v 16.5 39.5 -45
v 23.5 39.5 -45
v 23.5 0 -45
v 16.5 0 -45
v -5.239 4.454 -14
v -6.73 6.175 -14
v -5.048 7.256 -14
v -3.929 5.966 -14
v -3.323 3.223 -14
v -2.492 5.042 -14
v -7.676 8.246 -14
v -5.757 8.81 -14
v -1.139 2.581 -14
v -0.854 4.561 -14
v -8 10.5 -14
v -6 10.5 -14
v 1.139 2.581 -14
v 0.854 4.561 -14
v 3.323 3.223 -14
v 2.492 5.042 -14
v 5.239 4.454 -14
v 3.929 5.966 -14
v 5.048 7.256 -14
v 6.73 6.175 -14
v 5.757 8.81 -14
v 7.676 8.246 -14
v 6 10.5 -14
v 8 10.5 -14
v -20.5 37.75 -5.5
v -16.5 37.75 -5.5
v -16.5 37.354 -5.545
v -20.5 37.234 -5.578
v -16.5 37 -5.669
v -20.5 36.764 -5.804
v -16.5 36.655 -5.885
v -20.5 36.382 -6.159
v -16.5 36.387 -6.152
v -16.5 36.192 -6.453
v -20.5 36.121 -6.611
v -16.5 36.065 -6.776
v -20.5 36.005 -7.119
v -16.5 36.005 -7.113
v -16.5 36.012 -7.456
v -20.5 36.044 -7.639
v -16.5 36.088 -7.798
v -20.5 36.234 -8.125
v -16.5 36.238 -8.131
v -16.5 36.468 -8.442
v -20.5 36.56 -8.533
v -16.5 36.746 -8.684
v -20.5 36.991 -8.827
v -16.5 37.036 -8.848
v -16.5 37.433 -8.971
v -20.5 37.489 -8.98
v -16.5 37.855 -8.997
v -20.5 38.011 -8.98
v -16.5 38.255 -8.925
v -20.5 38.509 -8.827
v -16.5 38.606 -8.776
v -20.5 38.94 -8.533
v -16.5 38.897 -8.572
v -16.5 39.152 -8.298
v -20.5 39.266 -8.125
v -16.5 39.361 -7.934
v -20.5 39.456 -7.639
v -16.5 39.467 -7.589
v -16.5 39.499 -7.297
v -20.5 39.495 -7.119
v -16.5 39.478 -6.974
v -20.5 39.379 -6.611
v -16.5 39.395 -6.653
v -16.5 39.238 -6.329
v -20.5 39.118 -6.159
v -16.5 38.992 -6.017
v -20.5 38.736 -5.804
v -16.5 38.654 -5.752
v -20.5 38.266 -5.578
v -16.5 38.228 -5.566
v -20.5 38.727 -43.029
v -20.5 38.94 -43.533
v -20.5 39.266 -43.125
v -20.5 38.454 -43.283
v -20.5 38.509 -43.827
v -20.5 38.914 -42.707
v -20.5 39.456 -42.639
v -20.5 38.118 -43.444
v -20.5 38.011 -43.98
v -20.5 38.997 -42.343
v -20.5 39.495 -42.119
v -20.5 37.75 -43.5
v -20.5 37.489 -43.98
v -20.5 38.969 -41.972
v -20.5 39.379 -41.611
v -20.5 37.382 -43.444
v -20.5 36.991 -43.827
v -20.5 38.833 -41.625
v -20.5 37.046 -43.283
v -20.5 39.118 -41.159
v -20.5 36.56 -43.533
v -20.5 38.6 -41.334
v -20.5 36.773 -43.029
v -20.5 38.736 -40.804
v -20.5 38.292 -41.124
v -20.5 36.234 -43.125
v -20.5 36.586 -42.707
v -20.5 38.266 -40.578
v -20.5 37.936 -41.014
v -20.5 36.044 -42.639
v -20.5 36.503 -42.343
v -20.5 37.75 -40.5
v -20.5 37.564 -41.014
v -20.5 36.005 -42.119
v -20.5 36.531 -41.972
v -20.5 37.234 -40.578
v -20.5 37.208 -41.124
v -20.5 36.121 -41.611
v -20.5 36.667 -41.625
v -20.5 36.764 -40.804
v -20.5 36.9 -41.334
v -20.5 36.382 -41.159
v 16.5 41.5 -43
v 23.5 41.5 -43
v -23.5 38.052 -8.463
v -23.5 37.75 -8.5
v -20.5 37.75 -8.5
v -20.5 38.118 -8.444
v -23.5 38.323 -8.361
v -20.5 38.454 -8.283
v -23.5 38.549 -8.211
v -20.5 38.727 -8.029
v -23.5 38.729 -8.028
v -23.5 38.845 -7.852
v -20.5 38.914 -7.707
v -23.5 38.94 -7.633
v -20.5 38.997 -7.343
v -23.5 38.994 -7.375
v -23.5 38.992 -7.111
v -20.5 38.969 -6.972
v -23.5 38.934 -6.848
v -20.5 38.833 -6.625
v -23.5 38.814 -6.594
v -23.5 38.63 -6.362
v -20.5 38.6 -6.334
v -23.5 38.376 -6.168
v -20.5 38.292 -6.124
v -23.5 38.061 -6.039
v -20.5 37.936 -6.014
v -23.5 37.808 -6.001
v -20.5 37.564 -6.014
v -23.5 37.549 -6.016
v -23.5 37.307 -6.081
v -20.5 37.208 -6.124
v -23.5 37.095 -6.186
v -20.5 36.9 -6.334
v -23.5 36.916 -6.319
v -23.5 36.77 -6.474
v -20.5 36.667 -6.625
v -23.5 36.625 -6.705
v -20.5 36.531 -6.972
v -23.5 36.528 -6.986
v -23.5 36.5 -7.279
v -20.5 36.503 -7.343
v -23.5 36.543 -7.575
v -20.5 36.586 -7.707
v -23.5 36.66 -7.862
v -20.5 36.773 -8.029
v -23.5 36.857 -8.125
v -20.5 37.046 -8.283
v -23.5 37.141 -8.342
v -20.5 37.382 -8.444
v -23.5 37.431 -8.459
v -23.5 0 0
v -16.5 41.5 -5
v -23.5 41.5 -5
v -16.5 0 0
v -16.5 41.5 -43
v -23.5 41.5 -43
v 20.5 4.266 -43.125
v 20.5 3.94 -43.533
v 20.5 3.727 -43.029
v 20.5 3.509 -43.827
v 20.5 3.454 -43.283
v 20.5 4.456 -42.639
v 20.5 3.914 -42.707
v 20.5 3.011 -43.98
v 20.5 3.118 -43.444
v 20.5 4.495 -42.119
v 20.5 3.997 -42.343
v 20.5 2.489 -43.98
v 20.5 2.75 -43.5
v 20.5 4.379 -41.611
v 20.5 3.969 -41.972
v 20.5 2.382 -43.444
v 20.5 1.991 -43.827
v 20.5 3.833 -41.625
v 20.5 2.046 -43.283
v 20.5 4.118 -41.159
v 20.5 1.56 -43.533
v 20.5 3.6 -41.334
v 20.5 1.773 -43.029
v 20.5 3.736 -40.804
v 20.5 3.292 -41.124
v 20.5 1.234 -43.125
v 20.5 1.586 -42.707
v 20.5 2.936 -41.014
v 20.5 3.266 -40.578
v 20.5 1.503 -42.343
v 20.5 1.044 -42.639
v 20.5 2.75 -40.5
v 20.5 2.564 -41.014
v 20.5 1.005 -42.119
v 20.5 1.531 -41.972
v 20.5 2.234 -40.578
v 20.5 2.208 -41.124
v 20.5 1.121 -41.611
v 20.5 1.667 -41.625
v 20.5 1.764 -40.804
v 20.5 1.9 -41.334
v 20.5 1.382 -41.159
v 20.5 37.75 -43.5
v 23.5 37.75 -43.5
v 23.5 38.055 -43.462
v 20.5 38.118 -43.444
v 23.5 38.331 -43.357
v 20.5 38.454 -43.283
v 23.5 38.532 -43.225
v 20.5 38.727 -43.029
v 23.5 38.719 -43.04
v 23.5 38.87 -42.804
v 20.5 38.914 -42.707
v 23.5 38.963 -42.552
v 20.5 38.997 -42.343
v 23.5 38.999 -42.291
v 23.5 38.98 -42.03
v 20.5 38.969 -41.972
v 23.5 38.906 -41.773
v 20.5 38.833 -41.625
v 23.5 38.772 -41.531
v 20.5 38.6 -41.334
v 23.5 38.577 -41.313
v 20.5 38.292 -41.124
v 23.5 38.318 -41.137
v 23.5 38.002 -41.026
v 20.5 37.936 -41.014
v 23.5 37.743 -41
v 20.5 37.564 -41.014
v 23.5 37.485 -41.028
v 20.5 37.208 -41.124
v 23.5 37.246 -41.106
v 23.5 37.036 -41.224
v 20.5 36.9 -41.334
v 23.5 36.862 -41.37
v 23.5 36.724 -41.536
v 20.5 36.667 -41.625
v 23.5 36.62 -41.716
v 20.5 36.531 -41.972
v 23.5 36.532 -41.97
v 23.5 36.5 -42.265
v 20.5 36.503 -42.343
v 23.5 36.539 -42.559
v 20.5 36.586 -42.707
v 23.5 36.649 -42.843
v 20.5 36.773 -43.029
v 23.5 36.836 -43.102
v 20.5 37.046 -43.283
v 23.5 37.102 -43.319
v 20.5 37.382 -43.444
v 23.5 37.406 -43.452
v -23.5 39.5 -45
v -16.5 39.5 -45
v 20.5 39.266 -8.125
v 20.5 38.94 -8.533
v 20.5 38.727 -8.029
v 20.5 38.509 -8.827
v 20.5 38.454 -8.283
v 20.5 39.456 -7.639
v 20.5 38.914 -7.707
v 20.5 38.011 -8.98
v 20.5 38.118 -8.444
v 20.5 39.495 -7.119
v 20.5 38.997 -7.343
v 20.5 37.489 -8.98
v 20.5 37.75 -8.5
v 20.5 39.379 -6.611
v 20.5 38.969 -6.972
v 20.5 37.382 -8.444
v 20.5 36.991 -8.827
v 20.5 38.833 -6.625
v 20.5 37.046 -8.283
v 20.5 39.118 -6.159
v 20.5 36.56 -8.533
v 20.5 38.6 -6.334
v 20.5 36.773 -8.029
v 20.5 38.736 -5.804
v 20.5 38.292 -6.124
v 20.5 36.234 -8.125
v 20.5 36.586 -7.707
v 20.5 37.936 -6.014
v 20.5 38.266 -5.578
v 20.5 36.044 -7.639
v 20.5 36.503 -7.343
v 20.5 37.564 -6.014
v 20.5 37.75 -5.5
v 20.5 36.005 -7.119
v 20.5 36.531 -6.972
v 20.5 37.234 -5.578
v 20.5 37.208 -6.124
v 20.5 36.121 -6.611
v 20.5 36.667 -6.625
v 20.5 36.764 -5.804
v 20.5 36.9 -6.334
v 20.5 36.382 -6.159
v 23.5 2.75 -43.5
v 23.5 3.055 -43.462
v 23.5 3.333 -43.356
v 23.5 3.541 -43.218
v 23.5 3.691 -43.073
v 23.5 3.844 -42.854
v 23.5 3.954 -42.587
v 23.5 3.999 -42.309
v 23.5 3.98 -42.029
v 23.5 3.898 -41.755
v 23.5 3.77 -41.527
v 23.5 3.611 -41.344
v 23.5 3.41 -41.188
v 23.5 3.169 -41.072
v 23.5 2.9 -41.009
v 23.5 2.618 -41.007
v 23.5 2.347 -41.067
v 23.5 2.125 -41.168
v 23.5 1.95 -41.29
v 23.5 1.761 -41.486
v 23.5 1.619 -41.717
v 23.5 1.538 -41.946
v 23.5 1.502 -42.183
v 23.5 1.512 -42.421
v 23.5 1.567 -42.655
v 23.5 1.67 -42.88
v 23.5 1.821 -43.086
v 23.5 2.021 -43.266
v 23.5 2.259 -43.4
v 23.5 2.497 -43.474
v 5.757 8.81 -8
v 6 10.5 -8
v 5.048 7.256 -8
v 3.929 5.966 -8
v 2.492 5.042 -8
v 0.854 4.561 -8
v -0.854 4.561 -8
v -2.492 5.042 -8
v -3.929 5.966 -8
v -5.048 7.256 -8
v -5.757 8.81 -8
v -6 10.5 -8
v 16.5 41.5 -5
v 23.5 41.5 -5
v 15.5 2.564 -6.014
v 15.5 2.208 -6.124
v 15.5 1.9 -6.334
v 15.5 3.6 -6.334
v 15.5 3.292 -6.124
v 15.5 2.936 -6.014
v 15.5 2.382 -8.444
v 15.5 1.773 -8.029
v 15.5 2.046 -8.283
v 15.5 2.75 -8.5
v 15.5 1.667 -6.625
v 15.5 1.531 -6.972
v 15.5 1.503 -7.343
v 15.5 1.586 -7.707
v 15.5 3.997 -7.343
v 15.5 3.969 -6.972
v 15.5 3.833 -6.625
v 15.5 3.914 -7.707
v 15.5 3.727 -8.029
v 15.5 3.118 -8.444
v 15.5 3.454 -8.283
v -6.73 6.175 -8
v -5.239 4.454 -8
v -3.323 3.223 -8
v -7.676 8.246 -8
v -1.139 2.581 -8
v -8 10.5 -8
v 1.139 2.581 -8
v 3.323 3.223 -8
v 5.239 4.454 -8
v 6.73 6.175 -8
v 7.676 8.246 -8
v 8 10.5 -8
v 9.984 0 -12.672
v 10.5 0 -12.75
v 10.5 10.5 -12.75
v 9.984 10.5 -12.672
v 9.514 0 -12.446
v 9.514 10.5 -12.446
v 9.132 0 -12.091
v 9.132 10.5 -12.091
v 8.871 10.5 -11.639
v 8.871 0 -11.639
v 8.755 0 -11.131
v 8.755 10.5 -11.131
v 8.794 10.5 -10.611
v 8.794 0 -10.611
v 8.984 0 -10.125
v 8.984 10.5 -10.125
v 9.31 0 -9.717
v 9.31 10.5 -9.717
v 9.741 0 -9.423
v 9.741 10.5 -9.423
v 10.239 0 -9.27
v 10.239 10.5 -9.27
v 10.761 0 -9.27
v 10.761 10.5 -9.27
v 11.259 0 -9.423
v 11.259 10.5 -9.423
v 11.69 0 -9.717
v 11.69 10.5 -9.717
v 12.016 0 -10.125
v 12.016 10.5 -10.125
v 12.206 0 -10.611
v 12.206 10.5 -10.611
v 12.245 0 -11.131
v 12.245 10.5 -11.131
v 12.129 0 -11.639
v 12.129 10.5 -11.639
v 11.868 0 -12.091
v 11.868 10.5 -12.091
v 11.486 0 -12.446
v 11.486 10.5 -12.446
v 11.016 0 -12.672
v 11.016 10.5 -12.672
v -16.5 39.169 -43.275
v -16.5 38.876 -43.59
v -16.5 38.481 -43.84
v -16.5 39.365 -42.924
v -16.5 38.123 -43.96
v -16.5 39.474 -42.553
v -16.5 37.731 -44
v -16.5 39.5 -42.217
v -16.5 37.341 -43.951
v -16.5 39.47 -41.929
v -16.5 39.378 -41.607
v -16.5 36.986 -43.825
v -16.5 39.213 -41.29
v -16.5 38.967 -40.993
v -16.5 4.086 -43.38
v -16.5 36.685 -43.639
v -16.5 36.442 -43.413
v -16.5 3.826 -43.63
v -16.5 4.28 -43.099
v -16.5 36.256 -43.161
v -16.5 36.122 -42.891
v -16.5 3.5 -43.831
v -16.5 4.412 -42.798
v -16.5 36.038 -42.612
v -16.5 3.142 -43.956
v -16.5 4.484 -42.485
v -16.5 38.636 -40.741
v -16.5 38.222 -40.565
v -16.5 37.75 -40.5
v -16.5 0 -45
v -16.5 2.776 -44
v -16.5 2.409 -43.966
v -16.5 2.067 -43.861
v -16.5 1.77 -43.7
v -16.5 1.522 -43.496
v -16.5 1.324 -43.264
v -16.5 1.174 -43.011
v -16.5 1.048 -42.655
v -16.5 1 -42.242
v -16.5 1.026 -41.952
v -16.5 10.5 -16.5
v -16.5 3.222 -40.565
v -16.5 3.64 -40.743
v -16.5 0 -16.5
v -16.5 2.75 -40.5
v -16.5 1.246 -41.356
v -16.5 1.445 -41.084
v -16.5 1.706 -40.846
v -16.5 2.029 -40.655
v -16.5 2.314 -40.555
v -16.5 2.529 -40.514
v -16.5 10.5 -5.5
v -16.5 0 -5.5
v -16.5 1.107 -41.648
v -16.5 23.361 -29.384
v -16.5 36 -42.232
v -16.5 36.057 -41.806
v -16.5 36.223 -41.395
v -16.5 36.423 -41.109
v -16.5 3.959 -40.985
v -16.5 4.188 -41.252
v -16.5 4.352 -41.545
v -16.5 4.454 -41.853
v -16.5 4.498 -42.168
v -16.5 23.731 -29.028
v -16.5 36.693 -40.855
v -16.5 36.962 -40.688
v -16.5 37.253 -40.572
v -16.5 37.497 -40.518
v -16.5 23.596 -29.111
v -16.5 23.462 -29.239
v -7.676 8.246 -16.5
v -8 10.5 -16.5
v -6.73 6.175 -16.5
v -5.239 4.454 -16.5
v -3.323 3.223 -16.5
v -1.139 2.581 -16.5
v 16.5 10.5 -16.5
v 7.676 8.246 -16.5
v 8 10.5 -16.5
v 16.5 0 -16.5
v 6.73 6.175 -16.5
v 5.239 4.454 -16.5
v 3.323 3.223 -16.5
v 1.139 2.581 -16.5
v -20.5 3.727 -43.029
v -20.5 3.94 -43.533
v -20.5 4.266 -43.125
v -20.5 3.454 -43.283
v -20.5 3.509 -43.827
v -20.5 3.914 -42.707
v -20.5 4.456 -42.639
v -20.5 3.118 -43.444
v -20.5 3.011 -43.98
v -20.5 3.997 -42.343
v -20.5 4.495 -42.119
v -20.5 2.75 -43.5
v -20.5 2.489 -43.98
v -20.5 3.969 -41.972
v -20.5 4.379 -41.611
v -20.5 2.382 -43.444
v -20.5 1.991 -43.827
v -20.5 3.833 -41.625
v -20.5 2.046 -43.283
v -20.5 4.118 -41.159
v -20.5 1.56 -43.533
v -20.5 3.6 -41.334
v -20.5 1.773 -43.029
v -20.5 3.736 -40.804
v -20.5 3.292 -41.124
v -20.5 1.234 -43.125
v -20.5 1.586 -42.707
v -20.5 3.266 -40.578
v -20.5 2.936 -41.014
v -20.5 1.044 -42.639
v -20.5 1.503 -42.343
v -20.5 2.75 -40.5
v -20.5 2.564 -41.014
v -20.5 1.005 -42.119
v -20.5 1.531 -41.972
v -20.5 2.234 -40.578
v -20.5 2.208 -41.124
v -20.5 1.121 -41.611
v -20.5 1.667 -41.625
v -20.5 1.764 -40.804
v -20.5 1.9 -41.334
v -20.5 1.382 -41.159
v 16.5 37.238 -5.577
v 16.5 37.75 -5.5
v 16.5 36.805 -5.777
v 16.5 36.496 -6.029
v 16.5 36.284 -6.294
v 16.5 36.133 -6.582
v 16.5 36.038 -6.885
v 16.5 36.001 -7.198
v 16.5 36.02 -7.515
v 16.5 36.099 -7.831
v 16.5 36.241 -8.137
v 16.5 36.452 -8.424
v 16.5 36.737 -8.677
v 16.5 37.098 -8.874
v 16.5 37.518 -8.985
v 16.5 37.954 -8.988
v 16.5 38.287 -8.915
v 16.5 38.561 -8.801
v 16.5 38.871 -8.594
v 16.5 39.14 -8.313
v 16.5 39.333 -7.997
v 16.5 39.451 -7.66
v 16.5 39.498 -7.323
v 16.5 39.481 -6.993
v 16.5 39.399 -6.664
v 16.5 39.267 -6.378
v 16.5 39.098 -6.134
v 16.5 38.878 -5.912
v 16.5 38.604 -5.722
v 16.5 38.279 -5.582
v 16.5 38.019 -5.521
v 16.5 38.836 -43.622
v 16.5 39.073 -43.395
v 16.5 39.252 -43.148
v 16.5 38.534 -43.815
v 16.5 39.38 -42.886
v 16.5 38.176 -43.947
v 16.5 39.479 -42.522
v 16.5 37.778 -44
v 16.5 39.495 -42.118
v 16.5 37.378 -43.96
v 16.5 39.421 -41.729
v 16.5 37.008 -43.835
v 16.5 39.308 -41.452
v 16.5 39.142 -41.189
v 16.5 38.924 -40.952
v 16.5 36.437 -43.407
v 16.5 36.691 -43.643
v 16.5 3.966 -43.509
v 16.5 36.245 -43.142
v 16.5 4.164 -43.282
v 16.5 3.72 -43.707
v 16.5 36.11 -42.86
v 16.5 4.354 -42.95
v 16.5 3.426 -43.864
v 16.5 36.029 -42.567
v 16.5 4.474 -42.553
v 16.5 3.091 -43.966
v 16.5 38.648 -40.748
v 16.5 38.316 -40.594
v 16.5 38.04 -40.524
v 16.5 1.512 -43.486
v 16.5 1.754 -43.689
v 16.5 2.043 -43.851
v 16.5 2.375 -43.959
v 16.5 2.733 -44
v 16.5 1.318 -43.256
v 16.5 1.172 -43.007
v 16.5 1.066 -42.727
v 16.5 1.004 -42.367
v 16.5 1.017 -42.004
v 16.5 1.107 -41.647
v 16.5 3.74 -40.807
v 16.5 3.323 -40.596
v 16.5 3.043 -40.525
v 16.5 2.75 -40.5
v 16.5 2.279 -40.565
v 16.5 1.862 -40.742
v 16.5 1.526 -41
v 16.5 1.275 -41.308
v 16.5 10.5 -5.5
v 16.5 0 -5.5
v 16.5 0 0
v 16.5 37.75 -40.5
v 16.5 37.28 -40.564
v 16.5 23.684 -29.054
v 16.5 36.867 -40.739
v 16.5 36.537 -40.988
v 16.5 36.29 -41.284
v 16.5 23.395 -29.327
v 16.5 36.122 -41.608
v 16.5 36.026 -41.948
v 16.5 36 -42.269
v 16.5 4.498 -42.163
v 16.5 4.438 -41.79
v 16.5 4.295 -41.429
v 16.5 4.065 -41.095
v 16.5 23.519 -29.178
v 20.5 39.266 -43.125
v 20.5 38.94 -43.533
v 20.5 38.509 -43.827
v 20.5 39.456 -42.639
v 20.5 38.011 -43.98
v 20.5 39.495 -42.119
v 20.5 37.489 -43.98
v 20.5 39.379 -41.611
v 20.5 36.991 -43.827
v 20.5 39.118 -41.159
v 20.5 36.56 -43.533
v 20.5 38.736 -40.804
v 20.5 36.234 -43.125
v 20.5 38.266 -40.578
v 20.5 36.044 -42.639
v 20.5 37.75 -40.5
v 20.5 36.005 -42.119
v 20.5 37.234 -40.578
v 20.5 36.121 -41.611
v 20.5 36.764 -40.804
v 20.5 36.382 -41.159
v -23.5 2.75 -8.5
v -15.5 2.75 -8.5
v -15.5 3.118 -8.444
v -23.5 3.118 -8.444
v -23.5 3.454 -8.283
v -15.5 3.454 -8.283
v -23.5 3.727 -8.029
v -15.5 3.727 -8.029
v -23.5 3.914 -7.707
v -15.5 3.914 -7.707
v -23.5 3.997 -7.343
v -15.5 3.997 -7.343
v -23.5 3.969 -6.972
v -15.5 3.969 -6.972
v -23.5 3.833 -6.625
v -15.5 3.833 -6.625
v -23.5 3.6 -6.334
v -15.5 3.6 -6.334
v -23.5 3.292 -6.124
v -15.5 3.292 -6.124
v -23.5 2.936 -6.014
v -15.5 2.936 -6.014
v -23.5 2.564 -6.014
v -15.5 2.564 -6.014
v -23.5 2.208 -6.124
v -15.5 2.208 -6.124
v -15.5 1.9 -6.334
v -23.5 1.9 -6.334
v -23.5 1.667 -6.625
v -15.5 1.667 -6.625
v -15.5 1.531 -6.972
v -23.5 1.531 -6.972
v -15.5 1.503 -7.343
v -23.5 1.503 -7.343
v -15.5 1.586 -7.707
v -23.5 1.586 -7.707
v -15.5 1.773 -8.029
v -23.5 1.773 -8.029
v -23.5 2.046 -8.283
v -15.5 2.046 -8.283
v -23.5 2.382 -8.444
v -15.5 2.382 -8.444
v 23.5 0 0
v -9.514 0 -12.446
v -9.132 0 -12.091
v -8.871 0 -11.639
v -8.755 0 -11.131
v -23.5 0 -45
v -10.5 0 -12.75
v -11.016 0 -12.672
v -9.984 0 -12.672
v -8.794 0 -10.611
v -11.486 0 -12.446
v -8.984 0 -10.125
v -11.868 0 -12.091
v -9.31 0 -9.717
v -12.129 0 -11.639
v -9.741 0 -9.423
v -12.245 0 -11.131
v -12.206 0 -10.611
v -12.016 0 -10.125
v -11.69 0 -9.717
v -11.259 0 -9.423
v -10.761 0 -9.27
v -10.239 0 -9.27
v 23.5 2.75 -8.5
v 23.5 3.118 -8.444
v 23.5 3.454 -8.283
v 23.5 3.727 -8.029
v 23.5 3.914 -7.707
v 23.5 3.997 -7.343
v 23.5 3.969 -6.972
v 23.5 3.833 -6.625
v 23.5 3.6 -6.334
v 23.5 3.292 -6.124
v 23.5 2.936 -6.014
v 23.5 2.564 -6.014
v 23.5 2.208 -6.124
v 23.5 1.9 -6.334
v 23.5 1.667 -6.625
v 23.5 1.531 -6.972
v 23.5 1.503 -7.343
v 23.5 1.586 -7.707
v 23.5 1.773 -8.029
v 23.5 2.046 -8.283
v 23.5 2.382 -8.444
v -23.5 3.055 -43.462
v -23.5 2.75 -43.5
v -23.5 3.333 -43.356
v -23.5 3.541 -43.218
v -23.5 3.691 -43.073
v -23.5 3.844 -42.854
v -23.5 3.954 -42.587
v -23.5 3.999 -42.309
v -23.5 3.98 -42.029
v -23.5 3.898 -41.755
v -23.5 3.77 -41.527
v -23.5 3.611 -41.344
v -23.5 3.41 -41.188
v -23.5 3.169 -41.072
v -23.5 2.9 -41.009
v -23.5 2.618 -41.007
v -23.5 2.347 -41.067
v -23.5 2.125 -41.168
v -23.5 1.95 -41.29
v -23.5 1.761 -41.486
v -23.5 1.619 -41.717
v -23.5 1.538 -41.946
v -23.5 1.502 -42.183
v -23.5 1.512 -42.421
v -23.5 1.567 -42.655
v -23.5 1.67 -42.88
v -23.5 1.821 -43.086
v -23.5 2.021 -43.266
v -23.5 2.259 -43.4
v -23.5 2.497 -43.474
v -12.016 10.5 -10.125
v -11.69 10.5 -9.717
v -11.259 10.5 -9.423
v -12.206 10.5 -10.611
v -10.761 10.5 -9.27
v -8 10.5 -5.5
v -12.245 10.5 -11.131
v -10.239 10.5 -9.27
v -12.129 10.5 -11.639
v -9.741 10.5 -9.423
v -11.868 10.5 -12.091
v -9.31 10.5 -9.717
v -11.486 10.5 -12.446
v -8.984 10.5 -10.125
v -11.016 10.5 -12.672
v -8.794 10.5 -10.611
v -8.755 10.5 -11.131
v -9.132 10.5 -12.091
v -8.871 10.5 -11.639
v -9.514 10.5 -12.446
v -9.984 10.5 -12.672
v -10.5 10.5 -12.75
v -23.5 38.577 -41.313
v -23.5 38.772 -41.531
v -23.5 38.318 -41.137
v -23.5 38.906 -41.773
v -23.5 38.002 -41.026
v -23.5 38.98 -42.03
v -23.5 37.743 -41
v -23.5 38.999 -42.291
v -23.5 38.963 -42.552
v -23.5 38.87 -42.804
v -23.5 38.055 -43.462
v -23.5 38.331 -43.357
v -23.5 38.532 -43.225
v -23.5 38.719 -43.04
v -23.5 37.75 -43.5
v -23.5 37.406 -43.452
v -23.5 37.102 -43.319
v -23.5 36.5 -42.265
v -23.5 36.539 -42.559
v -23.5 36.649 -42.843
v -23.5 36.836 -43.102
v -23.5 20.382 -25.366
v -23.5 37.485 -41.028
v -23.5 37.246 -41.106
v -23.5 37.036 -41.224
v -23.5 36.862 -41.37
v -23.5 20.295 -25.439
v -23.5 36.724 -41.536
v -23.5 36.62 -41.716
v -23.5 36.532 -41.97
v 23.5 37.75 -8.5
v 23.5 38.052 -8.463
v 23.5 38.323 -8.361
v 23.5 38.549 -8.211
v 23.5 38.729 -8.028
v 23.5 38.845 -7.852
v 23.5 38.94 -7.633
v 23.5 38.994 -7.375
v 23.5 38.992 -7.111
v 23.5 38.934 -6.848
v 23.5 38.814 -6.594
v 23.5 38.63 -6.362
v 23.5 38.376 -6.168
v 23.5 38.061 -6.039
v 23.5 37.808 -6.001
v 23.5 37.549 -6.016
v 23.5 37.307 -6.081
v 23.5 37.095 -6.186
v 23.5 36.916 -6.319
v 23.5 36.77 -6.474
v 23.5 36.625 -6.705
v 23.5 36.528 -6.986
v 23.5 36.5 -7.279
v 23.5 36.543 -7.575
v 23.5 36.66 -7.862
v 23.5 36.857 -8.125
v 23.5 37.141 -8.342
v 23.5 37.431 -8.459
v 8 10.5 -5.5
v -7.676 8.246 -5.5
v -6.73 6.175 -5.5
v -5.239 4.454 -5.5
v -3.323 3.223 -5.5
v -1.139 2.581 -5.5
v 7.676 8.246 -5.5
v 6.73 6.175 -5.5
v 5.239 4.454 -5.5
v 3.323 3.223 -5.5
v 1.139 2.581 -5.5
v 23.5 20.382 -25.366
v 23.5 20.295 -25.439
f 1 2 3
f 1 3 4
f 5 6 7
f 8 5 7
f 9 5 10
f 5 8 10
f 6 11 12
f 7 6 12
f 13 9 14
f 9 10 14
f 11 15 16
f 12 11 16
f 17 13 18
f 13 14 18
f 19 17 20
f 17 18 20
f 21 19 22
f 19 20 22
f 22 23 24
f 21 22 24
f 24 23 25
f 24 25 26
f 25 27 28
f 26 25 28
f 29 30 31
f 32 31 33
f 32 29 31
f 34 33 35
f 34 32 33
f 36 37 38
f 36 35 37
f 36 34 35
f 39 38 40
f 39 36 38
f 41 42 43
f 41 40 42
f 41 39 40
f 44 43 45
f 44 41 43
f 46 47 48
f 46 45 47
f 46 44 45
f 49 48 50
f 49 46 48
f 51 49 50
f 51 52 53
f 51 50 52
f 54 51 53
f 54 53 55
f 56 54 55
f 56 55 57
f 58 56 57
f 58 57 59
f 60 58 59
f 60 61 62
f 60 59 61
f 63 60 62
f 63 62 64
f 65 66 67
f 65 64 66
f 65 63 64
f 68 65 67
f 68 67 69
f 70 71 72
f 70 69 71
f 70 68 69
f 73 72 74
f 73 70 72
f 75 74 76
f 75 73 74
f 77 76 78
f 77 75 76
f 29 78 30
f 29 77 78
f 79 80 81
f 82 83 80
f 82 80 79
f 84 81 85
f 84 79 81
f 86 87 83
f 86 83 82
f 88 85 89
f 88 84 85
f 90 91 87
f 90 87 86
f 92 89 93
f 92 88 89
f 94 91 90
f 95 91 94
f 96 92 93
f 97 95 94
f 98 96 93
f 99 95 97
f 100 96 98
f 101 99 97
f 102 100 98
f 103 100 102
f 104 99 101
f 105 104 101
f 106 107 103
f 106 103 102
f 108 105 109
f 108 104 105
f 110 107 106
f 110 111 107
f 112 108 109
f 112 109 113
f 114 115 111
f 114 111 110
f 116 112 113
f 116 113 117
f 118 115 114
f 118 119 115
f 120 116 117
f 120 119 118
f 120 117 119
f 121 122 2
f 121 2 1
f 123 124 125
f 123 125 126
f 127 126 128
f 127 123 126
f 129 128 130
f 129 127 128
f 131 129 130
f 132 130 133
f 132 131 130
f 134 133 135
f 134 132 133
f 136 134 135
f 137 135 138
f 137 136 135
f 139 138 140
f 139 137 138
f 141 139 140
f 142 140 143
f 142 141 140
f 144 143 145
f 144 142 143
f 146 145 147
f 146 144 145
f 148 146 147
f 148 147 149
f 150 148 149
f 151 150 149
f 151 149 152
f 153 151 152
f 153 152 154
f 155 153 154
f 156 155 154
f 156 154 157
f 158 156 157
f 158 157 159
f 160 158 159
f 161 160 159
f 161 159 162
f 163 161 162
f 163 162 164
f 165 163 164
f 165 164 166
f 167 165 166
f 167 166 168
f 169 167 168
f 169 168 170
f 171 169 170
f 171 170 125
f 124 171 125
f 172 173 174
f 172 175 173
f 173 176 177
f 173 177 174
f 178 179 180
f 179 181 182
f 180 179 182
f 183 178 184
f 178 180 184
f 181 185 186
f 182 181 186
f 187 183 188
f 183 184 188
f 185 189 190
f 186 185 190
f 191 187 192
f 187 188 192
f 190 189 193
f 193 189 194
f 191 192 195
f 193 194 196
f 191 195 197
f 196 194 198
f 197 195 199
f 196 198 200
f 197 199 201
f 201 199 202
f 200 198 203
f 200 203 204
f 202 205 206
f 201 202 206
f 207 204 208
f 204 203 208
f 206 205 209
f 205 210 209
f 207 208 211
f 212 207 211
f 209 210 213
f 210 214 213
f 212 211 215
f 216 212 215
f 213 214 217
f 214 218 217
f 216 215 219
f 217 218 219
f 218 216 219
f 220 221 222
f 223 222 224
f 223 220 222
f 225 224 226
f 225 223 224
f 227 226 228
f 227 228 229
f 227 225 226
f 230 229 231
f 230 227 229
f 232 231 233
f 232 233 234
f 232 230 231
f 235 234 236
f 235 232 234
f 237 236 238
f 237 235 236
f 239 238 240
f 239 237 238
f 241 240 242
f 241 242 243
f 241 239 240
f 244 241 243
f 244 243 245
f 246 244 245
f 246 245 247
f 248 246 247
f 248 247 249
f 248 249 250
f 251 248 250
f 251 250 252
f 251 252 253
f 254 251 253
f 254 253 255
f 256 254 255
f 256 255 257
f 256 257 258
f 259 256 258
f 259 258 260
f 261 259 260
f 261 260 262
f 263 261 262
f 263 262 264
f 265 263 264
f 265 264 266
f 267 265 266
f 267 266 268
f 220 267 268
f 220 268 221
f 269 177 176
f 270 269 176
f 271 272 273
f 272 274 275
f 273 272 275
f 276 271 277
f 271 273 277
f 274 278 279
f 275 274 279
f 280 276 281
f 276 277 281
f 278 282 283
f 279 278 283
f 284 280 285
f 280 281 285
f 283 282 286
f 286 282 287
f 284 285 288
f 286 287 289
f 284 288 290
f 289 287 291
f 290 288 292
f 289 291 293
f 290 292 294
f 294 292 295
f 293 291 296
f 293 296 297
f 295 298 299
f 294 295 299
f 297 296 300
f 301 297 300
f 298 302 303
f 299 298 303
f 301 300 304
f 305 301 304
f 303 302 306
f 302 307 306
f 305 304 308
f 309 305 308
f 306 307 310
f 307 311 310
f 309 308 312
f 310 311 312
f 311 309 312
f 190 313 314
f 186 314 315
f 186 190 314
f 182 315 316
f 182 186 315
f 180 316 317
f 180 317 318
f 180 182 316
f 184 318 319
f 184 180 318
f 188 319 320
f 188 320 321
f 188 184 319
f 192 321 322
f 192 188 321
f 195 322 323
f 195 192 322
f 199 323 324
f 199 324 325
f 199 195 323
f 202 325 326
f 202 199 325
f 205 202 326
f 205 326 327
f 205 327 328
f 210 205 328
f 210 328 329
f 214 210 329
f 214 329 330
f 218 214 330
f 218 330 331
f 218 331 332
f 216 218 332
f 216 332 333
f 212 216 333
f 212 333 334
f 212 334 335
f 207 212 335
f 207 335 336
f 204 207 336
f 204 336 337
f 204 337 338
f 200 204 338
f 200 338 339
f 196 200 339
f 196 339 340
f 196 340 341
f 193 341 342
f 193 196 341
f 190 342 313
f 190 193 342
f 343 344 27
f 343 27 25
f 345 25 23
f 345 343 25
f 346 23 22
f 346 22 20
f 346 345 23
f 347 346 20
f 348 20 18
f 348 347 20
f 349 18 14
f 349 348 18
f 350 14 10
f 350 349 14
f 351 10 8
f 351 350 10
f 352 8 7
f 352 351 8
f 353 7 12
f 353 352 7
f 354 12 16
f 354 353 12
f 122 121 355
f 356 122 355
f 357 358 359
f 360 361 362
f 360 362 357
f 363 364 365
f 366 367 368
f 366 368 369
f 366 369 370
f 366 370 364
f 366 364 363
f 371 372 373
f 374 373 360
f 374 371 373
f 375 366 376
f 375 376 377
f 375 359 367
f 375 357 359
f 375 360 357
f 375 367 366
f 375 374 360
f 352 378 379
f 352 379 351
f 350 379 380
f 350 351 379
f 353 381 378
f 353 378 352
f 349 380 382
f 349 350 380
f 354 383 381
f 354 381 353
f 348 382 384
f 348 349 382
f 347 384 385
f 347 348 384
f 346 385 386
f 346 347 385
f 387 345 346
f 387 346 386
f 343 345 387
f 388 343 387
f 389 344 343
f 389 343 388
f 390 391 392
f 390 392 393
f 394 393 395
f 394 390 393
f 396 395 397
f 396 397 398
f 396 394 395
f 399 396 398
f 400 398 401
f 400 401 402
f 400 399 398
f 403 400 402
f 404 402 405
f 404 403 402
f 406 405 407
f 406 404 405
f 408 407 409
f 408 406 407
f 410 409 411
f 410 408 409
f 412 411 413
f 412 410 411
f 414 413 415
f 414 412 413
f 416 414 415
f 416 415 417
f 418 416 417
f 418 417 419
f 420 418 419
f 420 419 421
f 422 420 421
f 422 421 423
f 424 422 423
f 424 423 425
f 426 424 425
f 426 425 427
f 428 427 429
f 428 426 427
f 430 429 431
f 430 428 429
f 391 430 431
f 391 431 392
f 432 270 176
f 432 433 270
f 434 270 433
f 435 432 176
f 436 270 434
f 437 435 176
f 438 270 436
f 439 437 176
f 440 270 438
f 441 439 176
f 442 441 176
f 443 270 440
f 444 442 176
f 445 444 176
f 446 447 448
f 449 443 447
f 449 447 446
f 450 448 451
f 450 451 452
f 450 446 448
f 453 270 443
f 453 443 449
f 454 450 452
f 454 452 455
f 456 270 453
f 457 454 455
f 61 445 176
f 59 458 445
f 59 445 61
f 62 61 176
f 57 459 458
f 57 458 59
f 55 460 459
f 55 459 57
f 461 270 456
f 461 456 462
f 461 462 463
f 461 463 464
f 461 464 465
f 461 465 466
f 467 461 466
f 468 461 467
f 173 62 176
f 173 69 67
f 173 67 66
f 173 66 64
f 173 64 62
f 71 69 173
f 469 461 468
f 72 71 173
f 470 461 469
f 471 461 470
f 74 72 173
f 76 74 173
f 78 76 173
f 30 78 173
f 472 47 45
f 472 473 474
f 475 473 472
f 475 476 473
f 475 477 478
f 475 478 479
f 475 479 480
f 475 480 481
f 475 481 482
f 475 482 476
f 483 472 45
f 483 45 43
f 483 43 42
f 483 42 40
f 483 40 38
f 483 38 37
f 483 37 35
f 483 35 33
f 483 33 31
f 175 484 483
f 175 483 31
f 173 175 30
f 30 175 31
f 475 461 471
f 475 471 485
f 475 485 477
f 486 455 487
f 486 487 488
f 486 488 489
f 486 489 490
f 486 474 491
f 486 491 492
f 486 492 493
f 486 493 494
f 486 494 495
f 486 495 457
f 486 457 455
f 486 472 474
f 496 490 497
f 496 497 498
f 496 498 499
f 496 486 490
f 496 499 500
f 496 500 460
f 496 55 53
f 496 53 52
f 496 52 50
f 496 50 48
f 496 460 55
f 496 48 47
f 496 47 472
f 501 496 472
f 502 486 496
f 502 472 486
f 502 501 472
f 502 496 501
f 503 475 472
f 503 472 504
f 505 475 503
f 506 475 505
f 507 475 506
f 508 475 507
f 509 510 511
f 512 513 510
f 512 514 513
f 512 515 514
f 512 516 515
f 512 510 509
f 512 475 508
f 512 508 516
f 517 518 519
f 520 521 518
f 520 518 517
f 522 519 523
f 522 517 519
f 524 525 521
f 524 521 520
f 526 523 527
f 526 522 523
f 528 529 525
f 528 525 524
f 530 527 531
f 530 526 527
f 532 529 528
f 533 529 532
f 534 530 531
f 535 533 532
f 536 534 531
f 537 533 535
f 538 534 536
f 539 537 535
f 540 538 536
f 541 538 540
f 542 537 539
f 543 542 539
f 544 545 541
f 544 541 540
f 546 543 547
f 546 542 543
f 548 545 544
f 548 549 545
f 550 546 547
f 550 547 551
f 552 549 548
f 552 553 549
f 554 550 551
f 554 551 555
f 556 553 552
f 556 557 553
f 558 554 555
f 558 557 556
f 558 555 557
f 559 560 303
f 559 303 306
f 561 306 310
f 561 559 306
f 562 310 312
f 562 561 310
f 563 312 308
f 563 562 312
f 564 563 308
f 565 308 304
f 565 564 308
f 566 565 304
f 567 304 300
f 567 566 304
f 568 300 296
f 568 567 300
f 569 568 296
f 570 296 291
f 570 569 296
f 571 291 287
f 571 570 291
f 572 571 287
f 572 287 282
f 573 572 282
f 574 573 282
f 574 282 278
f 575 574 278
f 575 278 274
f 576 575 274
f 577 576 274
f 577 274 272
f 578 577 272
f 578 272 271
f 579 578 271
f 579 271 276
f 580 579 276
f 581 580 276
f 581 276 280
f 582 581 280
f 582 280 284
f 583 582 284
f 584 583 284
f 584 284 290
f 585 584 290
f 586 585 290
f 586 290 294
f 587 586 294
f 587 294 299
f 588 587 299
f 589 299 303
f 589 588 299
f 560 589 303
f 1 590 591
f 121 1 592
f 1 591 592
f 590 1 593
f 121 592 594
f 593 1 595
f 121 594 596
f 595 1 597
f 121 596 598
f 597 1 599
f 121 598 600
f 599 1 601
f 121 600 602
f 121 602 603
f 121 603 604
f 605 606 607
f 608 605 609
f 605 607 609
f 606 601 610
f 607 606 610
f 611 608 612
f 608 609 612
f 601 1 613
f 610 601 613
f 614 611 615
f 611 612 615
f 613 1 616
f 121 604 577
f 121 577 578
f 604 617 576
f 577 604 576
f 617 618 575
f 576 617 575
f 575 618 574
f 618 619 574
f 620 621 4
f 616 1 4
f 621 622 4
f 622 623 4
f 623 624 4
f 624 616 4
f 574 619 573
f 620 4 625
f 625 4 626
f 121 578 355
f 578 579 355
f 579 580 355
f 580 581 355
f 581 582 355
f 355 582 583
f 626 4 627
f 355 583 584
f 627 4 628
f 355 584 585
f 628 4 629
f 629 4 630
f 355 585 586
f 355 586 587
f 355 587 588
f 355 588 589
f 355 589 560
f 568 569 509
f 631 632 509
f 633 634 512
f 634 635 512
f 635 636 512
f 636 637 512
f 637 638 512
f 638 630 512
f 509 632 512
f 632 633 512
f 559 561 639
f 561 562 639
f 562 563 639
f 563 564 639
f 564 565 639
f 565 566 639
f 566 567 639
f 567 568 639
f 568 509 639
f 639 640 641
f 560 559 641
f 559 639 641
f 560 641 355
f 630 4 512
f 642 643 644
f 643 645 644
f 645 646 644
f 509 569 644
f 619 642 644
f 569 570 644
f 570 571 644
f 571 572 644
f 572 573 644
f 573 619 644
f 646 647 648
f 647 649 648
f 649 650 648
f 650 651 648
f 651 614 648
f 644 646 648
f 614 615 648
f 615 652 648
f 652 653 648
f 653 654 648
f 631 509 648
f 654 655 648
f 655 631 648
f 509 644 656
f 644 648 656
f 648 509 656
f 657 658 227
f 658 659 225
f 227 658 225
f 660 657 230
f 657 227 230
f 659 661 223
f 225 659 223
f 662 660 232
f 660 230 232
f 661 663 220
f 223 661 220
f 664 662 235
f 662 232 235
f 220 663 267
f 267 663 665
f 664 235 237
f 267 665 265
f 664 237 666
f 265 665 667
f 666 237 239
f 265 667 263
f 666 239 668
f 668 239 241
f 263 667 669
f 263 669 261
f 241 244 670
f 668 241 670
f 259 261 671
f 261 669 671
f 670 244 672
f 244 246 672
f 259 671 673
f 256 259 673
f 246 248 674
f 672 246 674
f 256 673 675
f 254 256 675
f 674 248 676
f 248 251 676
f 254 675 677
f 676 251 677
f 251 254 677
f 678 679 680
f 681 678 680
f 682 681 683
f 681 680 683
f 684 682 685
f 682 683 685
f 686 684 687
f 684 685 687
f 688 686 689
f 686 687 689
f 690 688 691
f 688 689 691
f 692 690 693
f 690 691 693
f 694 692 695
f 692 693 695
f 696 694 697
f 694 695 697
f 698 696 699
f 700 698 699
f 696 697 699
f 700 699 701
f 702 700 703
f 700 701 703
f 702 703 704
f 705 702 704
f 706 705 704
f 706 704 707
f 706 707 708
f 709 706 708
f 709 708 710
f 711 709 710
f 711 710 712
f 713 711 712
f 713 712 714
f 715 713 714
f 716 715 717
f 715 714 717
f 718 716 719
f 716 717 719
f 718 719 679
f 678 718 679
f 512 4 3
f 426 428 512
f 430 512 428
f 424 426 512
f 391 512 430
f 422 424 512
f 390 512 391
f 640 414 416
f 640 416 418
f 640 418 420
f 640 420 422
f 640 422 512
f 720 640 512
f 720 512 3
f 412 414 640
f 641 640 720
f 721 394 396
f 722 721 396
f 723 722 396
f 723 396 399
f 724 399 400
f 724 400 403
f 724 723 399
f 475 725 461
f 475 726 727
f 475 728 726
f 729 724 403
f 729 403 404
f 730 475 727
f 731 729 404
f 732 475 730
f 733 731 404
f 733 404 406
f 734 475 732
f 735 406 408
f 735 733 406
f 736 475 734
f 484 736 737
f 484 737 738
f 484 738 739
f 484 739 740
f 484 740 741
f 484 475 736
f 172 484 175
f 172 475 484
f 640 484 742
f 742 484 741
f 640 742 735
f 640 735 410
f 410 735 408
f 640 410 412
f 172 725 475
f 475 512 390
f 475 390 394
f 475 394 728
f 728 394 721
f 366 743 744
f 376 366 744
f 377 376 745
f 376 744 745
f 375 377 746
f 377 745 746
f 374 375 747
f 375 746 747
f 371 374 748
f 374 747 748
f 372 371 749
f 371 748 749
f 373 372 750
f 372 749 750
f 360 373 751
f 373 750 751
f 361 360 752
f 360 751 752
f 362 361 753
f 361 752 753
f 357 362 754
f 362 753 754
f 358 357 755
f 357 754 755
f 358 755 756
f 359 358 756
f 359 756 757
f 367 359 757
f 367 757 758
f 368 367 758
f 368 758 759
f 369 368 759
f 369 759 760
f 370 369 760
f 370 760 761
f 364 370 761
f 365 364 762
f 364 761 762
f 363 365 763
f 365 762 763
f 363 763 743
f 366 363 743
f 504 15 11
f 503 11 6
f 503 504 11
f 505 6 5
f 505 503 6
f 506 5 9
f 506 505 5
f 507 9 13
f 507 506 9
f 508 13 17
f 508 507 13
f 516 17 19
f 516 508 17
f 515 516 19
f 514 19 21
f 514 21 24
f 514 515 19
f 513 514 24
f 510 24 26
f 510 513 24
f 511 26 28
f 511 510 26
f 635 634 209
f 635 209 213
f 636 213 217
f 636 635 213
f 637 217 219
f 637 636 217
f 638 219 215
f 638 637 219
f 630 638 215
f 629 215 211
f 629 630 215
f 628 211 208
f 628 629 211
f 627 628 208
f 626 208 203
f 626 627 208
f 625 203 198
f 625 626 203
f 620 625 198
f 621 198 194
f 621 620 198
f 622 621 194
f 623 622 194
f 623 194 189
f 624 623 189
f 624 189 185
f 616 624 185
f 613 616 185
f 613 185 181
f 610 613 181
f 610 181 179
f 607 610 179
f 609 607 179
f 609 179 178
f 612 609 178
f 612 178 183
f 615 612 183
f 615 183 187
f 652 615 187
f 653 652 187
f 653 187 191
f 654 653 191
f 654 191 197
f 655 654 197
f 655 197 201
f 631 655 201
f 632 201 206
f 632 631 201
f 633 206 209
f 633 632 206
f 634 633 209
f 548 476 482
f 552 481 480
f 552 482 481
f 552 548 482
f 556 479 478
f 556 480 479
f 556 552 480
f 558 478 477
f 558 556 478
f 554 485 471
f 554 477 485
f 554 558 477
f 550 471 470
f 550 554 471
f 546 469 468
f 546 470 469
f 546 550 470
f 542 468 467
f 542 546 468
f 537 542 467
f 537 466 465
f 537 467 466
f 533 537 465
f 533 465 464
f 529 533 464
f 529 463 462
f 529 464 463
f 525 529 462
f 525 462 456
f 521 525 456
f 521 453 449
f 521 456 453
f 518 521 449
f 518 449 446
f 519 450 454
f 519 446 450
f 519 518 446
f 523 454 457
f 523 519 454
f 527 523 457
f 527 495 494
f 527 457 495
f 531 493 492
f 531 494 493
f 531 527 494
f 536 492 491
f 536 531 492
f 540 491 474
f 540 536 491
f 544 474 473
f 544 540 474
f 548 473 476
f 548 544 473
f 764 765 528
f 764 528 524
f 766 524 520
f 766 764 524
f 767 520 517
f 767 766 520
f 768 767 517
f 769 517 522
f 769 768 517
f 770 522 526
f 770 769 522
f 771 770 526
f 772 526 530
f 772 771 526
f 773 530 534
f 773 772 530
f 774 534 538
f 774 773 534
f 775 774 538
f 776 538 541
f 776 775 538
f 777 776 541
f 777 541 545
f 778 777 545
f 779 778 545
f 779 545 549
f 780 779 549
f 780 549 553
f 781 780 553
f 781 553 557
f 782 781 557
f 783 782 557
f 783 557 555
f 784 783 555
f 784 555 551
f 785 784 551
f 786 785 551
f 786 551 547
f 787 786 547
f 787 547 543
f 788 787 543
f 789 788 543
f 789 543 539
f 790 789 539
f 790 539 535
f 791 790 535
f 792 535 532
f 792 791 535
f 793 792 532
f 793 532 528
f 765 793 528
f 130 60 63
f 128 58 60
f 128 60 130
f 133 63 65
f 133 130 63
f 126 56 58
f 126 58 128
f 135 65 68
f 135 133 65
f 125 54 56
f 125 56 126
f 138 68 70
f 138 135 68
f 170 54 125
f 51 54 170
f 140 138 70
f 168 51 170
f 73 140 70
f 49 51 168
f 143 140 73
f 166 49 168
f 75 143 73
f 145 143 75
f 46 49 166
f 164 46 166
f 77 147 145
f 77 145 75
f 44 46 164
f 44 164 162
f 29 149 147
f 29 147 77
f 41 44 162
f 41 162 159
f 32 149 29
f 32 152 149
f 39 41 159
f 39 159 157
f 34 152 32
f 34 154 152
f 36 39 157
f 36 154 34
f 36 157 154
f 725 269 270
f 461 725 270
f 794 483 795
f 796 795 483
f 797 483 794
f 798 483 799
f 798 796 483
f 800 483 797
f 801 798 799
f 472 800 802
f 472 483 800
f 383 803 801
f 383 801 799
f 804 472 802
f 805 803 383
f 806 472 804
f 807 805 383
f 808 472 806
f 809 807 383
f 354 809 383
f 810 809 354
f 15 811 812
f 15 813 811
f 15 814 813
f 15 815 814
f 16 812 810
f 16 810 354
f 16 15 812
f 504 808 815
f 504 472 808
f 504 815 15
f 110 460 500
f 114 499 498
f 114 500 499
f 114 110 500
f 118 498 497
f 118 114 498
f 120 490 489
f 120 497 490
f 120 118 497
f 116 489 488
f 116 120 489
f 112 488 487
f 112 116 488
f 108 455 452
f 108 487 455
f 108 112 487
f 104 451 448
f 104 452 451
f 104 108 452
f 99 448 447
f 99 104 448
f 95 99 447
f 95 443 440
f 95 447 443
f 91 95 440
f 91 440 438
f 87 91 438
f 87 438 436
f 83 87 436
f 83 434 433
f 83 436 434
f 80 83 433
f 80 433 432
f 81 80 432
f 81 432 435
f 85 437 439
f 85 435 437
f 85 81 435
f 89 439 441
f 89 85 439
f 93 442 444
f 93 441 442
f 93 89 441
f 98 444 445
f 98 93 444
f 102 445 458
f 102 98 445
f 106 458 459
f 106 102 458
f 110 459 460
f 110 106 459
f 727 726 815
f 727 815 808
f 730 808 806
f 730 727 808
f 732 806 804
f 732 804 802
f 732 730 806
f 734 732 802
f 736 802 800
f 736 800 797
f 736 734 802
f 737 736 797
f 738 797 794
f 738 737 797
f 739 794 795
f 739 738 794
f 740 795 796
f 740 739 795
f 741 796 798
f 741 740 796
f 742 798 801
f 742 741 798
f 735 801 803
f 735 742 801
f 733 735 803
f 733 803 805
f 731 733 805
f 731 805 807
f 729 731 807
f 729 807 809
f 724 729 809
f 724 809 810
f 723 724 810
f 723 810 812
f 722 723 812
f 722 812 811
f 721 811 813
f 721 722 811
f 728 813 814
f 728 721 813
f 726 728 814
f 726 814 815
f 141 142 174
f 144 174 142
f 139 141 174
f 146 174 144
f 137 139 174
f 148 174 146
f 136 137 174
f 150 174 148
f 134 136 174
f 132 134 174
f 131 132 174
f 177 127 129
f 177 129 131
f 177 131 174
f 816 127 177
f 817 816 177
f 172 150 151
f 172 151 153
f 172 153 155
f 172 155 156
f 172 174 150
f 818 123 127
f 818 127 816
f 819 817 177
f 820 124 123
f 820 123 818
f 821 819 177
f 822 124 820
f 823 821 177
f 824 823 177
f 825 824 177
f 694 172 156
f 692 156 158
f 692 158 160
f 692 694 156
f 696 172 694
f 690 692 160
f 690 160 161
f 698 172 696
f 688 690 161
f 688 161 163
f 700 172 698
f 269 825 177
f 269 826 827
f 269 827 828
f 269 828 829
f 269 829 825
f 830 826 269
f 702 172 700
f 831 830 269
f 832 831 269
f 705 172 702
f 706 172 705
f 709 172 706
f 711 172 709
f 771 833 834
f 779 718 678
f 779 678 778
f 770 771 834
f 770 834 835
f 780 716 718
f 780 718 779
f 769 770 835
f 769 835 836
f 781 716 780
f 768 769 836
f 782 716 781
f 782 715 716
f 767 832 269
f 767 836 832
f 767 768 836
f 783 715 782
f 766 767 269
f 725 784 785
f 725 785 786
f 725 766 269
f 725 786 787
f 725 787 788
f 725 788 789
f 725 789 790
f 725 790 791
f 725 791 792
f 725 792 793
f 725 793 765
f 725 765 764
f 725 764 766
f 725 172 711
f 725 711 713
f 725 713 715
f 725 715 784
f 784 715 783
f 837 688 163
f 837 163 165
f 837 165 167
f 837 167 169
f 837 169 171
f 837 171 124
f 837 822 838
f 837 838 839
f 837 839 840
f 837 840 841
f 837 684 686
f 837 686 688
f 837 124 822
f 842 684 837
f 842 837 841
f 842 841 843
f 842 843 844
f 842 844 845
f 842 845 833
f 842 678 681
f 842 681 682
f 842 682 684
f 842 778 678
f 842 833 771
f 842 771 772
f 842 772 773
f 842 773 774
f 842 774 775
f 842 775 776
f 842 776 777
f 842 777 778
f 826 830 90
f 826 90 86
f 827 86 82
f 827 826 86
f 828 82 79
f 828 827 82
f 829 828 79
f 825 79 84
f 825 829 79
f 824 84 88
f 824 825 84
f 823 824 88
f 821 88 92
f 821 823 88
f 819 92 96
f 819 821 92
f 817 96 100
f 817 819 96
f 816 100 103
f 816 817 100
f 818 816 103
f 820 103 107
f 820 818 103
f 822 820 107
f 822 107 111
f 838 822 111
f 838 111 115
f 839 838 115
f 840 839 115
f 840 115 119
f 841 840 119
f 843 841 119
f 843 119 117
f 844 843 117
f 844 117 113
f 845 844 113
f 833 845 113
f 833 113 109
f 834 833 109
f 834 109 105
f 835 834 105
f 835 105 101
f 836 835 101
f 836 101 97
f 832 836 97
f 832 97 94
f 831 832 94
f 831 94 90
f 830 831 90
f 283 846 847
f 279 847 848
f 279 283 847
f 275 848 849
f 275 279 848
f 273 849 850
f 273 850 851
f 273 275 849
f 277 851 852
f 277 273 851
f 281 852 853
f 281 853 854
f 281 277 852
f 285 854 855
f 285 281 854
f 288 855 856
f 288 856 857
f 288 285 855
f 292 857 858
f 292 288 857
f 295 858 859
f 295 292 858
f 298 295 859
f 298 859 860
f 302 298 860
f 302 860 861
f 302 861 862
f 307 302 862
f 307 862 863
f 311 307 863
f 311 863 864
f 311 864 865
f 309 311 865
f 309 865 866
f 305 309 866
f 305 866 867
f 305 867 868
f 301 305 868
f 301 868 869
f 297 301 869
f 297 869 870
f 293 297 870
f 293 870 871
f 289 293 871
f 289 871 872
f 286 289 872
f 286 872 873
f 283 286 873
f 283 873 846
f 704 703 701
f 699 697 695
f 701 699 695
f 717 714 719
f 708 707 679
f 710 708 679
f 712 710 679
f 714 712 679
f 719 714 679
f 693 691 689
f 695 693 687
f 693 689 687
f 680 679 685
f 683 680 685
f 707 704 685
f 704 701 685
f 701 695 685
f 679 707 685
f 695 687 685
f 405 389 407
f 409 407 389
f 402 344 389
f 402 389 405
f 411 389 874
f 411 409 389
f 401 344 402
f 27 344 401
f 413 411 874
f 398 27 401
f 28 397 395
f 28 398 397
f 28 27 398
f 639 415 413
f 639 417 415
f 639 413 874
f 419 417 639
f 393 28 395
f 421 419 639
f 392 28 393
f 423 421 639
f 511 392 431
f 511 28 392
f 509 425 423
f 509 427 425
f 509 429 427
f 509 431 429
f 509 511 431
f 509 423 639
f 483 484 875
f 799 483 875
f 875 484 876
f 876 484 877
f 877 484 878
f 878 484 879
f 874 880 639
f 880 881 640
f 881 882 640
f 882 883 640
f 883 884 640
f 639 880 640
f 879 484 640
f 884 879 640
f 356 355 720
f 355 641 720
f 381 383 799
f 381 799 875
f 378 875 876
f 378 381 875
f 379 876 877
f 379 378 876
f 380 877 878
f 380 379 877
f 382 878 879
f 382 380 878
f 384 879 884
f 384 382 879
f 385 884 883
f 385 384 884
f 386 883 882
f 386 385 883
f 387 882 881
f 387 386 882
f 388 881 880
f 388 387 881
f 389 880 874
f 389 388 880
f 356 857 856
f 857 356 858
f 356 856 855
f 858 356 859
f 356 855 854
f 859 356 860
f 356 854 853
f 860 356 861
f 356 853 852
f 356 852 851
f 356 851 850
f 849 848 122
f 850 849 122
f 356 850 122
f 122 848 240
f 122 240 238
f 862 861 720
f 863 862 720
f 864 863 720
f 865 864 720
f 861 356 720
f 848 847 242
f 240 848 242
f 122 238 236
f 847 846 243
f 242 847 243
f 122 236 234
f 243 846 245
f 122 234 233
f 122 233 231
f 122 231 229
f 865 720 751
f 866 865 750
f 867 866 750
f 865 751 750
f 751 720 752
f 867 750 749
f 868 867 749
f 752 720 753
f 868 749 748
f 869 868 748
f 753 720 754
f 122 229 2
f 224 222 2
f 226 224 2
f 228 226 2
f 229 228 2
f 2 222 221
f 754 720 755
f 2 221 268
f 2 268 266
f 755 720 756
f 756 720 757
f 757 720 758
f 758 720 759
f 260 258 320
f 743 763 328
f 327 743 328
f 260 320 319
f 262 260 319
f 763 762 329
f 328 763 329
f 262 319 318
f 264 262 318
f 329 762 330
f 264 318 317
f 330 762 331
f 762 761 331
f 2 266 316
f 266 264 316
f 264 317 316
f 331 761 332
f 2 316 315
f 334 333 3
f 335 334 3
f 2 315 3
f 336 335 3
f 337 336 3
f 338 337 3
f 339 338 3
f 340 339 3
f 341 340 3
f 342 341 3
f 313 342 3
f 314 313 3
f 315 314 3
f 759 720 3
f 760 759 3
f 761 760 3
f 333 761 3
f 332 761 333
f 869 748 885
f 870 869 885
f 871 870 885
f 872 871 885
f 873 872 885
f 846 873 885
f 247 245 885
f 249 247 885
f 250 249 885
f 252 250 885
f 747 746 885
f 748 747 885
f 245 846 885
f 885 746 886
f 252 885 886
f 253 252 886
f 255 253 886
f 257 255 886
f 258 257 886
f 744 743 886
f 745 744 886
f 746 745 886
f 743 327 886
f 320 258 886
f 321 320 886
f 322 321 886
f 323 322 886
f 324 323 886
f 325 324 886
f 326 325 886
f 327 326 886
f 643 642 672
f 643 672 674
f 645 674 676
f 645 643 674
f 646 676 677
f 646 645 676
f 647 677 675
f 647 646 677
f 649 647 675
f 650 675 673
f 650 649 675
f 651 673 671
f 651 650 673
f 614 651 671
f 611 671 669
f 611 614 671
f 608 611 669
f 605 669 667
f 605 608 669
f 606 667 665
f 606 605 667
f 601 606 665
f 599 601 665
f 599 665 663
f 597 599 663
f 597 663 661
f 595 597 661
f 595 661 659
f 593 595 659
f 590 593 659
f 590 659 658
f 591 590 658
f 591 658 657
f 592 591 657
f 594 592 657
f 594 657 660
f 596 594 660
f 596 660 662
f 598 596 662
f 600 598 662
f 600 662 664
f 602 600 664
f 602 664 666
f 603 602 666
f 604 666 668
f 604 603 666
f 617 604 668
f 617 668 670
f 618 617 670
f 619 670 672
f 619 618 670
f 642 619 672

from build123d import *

# Parameters (mm, degrees)
SKETCH1_W               = 33
SKETCH1_H               = 11
SKETCH1_R               = 1.75
BOSS_EXTRUDE1_DEPTH     = 10.5
CHAMFER1_SIZE           = 2
CUT_EXTRUDE1_DEPTH      = 66.570572836
CUT_EXTRUDE1_DEPTH_BACK = 66.570572836
SKETCH3_R               = 1.25
CUT_EXTRUDE2_DEPTH      = 20.5
CUT_EXTRUDE2_DEPTH_BACK = 20.5
SKETCH3_3_R             = 1.75
SKETCH3_3_R_2           = 1.25
CUT_EXTRUDE3_START      = 23.5
SKETCH3_6_R             = 1.25
CUT_EXTRUDE3_DEPTH      = 8
CUT_EXTRUDE4_START      = -15.5
SKETCH3_7_R             = 1.25
CUT_EXTRUDE4_DEPTH      = 8
CUT_EXTRUDE5_DEPTH      = 59.570470544
CUT_EXTRUDE5_DEPTH_BACK = 59.570470544
BOSS_EXTRUDE2_DEPTH     = 3


with BuildPart() as part:
    # Sketch1 → Boss-Extrude1 (new body)
    with BuildSketch(Plane(origin=(0, 0, 0), x_dir=(1, 0, 0), z_dir=(0, 1, 0))):
        with Locations((0, 11)):
            Rectangle(SKETCH1_W, SKETCH1_H)
        with Locations(Location((-10.5, 11, 0), (0, 0, 90))):
            Circle(SKETCH1_R, mode=Mode.SUBTRACT)
        with Locations(Location((10.5, 11, 0), (0, 0, 90))):
            Circle(SKETCH1_R, mode=Mode.SUBTRACT)
    extrude(amount=BOSS_EXTRUDE1_DEPTH)

    # Sketch2 → Loft1 section 0
    with BuildSketch(Plane(origin=(0, 41.5, 0), x_dir=(1, 0, 0), z_dir=(0, 1, 0))):
        with BuildLine():
            Line((-23.5, 45), (-16.5, 45))
            Line((-16.5, 45), (-16.5, 5))
            Line((-16.5, 5), (-23.5, 5))
            Line((-23.5, 5), (-23.5, 45))
        make_face()
    # Sketch1<3> → Loft1 section 1
    with BuildSketch(Plane(origin=(0, 0, 0), x_dir=(1, 0, 0), z_dir=(0, 1, 0))):
        with BuildLine():
            Line((-23.5, 45), (-16.5, 45))
            Line((-16.5, 45), (-16.5, 0))
            Line((-16.5, 0), (-23.5, 0))
            Line((-23.5, 0), (-23.5, 45))
        make_face()
    loft()

    # Sketch2<3> → Loft2 section 0
    with BuildSketch(Plane(origin=(0, 41.5, 0), x_dir=(1, 0, 0), z_dir=(0, 1, 0))):
        with BuildLine():
            Line((16.5, 45), (16.5, 5))
            Line((16.5, 5), (23.5, 5))
            Line((23.5, 5), (23.5, 45))
            Line((23.5, 45), (16.5, 45))
        make_face()
    # Sketch1<4> → Loft2 section 1
    with BuildSketch(Plane(origin=(0, 0, 0), x_dir=(1, 0, 0), z_dir=(0, 1, 0))):
        with BuildLine():
            Line((16.5, 45), (16.5, 0))
            Line((16.5, 0), (23.5, 0))
            Line((23.5, 0), (23.5, 45))
            Line((23.5, 45), (16.5, 45))
        make_face()
    loft()

    # Chamfer1
    chamfer1_edges = [part.edges().sort_by_distance(p)[0] for p in [
        (20, 41.5, -45),
        (-20, 41.5, -45),
    ]]
    chamfer(chamfer1_edges, length=CHAMFER1_SIZE)

    # Sketch3 → Cut-Extrude1 (cut, two sides: drawn at the far end of the back side and taken through both)
    with BuildSketch(Plane(origin=(0, 0, 0), x_dir=(0, 0, -1), z_dir=(1, 0, 0)).offset(-CUT_EXTRUDE1_DEPTH_BACK)):
        with Locations((7.25, 37.75)):
            Circle(SKETCH3_R)
        with Locations((42.25, 37.75)):
            Circle(SKETCH3_R)
        with Locations((42.25, 2.75)):
            Circle(SKETCH3_R)
    extrude(amount=CUT_EXTRUDE1_DEPTH + CUT_EXTRUDE1_DEPTH_BACK, mode=Mode.SUBTRACT)

    # Sketch3<3> → Cut-Extrude2 (cut, two sides: drawn at the far end of the back side and taken through both)
    # profile 1 of 3: a face of its own
    with BuildSketch(Plane(origin=(0, 0, 0), x_dir=(0, 0, -1), z_dir=(1, 0, 0)).offset(-CUT_EXTRUDE2_DEPTH_BACK)):
        with Locations(Location((7.25, 37.75, 0), (0, 0, 180))):
            Circle(SKETCH3_3_R)
        with Locations((7.25, 37.75)):
            Circle(SKETCH3_3_R_2, mode=Mode.SUBTRACT)
    # profile 2 of 3: a face of its own
    with BuildSketch(Plane(origin=(0, 0, 0), x_dir=(0, 0, -1), z_dir=(1, 0, 0)).offset(-CUT_EXTRUDE2_DEPTH_BACK)):
        with Locations(Location((42.25, 37.75, 0), (0, 0, 180))):
            Circle(SKETCH3_3_R)
        with Locations((42.25, 37.75)):
            Circle(SKETCH3_3_R_2, mode=Mode.SUBTRACT)
    # profile 3 of 3: a face of its own
    with BuildSketch(Plane(origin=(0, 0, 0), x_dir=(0, 0, -1), z_dir=(1, 0, 0)).offset(-CUT_EXTRUDE2_DEPTH_BACK)):
        with Locations(Location((42.25, 2.75, 0), (0, 0, 180))):
            Circle(SKETCH3_3_R)
        with Locations((42.25, 2.75)):
            Circle(SKETCH3_3_R_2, mode=Mode.SUBTRACT)
    extrude(amount=CUT_EXTRUDE2_DEPTH + CUT_EXTRUDE2_DEPTH_BACK, mode=Mode.SUBTRACT)

    # Sketch3<6> → Cut-Extrude3 (cut)
    with BuildSketch(Plane(origin=(0, 0, 0), x_dir=(0, 0, -1), z_dir=(1, 0, 0)).offset(CUT_EXTRUDE3_START)):
        with Locations((7.25, 2.75)):
            Circle(SKETCH3_6_R)
    extrude(amount=-CUT_EXTRUDE3_DEPTH, mode=Mode.SUBTRACT)

    # Sketch3<7> → Cut-Extrude4 (cut)
    with BuildSketch(Plane(origin=(0, 0, 0), x_dir=(0, 0, -1), z_dir=(1, 0, 0)).offset(CUT_EXTRUDE4_START)):
        with Locations((7.25, 2.75)):
            Circle(SKETCH3_7_R)
    extrude(amount=-CUT_EXTRUDE4_DEPTH, mode=Mode.SUBTRACT)

    # Sketch4 → Cut-Extrude5 (cut, two sides: drawn at the far end of the back side and taken through both)
    with BuildSketch(Plane.XY.offset(-11).offset(-CUT_EXTRUDE5_DEPTH_BACK)):
        with BuildLine():
            ThreePointArc((-6, 10.5), (0, 16.5), (6, 10.5))
            Line((6, 10.5), (8, 10.5))
            ThreePointArc((8, 10.5), (0, 18.5), (-8, 10.5))
            Line((-8, 10.5), (-6, 10.5))
        make_face()
        with BuildLine():
            Line((8, 10.5), (6, 10.5))
            ThreePointArc((6, 10.5), (0, 4.5), (-6, 10.5))
            Line((-6, 10.5), (-8, 10.5))
            ThreePointArc((-8, 10.5), (0, 2.5), (8, 10.5))
        make_face()
        with BuildLine():
            ThreePointArc((-6, 10.5), (0, 4.5), (6, 10.5))
            Line((6, 10.5), (-6, 10.5))
        make_face()
        with BuildLine():
            Line((-6, 10.5), (6, 10.5))
            ThreePointArc((6, 10.5), (0, 16.5), (-6, 10.5))
        make_face()
    extrude(amount=CUT_EXTRUDE5_DEPTH + CUT_EXTRUDE5_DEPTH_BACK, mode=Mode.SUBTRACT)

    # Sketch4<4> → Boss-Extrude2 (add, symmetric)
    with BuildSketch(Plane.XY.offset(-11)):
        with BuildLine():
            Line((8, 10.5), (6, 10.5))
            ThreePointArc((6, 10.5), (0, 4.5), (-6, 10.5))
            Line((-6, 10.5), (-8, 10.5))
            ThreePointArc((-8, 10.5), (0, 2.5), (8, 10.5))
        make_face()
    extrude(amount=BOSS_EXTRUDE2_DEPTH, both=True)


solid = part.part
